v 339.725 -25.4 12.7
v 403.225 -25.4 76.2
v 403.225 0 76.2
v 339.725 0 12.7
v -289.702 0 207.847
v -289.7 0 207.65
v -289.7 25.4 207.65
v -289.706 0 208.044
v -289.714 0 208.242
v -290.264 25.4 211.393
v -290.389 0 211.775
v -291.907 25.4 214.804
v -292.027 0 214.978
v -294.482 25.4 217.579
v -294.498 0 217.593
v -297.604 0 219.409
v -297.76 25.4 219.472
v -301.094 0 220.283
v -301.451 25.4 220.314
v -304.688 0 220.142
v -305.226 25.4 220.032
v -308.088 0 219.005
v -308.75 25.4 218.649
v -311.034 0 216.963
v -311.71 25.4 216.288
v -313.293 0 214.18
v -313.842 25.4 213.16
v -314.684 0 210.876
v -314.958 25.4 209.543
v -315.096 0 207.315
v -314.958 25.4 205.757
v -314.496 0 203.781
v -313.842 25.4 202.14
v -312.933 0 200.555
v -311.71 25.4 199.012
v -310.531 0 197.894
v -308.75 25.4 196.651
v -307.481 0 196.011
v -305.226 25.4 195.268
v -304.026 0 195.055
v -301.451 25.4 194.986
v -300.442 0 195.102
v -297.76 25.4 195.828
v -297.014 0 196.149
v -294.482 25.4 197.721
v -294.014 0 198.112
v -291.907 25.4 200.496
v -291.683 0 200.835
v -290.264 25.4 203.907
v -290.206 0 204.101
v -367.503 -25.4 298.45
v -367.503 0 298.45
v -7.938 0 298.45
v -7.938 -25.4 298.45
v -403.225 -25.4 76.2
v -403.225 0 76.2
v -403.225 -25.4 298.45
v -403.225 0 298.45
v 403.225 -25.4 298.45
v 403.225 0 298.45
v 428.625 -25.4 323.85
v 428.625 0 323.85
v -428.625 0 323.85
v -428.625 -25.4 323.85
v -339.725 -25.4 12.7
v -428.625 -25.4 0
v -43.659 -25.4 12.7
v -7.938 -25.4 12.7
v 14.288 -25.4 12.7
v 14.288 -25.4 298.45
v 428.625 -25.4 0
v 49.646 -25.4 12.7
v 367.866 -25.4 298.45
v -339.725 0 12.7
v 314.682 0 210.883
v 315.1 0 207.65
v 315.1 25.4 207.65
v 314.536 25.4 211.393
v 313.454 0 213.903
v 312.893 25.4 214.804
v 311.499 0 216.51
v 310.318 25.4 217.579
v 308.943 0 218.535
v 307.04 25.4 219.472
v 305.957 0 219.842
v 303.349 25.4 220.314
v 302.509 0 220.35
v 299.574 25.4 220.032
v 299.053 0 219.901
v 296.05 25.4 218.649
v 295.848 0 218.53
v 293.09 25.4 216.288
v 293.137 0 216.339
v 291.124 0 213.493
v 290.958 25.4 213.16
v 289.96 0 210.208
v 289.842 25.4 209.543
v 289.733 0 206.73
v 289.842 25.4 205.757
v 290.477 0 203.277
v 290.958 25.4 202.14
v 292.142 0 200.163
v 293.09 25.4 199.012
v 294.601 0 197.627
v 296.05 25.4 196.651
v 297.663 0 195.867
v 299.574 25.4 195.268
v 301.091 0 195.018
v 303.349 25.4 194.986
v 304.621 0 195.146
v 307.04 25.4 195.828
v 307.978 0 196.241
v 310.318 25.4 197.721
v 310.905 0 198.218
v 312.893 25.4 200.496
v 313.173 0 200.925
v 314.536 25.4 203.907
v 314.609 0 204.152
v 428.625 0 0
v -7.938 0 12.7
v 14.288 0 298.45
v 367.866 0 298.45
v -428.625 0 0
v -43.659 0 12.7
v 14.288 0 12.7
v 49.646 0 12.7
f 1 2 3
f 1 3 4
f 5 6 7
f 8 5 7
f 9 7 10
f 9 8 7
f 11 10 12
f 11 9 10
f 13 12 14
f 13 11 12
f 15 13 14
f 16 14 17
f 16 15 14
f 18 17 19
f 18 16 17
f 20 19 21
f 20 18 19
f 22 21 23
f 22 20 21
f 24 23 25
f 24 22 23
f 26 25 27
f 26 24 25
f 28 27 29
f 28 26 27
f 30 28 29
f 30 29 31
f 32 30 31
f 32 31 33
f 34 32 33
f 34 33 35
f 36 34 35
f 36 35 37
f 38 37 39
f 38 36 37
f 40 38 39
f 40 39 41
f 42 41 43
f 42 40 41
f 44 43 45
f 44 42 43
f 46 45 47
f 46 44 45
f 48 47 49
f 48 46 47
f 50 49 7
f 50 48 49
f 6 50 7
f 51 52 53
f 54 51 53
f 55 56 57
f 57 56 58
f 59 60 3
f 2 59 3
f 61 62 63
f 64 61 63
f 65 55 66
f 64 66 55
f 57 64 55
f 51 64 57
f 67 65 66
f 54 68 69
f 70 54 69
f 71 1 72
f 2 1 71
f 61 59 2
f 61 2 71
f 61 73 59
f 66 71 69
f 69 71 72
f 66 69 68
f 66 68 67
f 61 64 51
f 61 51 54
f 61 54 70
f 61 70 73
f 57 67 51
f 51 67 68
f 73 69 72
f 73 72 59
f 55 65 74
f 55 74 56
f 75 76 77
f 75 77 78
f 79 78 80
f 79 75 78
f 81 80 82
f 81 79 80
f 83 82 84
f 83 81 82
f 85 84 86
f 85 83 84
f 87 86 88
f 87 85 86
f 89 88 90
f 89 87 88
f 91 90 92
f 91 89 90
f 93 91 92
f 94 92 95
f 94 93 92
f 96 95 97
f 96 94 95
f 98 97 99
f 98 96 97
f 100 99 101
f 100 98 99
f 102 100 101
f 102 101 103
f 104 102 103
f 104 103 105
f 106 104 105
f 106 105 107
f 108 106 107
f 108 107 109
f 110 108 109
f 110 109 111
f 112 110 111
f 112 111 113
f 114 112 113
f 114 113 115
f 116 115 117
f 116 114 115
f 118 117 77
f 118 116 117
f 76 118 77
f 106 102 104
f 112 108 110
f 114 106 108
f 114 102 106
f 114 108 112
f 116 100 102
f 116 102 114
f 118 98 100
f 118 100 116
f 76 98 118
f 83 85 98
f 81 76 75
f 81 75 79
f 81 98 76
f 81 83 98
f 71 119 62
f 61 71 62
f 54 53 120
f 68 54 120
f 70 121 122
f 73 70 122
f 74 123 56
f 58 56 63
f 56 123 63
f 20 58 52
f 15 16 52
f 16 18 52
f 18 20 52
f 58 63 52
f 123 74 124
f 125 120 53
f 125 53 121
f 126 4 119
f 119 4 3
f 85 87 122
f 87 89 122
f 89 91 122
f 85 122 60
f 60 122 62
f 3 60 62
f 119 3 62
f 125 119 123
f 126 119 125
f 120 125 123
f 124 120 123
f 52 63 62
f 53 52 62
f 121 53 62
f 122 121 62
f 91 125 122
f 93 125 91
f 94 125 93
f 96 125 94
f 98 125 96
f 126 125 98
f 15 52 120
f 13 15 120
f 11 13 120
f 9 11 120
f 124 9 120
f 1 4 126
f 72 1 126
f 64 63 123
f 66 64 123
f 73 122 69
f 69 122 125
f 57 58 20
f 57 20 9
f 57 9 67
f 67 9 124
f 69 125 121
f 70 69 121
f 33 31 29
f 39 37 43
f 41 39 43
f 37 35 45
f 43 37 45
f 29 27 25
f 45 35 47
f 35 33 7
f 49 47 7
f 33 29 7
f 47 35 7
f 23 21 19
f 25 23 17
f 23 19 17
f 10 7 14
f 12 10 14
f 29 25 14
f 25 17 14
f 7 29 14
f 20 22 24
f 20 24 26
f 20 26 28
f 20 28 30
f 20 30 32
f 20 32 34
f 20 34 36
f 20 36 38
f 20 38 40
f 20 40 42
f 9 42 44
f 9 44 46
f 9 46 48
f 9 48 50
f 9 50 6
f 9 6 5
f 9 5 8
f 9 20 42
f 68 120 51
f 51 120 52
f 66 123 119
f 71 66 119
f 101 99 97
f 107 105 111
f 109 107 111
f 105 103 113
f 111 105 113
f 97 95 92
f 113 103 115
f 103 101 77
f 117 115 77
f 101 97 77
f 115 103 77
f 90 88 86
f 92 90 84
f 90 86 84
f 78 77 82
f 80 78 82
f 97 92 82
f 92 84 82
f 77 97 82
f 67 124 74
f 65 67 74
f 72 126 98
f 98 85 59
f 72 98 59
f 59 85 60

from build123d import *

# Parameters (mm, degrees)
F1_DEPTH = 25.4
F3_DEPTH = 25.4
F4_R     = 12.7
F5_DEPTH = 25.4


with BuildPart() as f1:
    # F0 (on Front) → F1 (new body)
    with BuildSketch(Plane.XZ):
        Polygon((403.225, 12.7), (428.625, 12.7), (428.625, 298.45), (428.625, 323.85), (-428.625, 323.85), (-428.625, 298.45), (-428.625, 12.7), (-403.225, 12.7), (-403.225, 298.45), (-43.6594735359, 12.7), (-7.9375, 12.7), (14.2875, 12.7), (49.6461265683, 12.7), (403.225, 298.45), align=None)
        Polygon((-7.9375, 298.45), (-7.9375, 12.7), (-367.5030264641, 298.45), align=None, mode=Mode.SUBTRACT)
        Polygon((367.8663734317, 298.45), (14.2875, 12.7), (14.2875, 298.45), align=None, mode=Mode.SUBTRACT)
        Polygon((428.625, 0), (428.625, 12.7), (403.225, 12.7), (49.6461265683, 12.7), (14.2875, 12.7), (-7.9375, 12.7), (-43.6594735359, 12.7), (-403.225, 12.7), (-428.625, 12.7), (-428.625, 0), align=None)
    extrude(amount=F1_DEPTH)

    # F2 (on face) → F3 (join)
    with BuildSketch(Plane.XZ.offset(25.4)):
        Polygon((-339.725, 12.7), (-403.225, 76.2), (-403.225, 12.7), align=None)
        Polygon((403.225, 76.2), (339.725, 12.7), (403.225, 12.7), align=None)
    extrude(amount=-F3_DEPTH)

    # F4 (on Front) → F5 (join)
    with BuildSketch(Plane.XZ):
        with Locations((-302.4, 207.65)):
            Circle(F4_R)
        with Locations((302.4, 207.65)):
            Circle(F4_R)
    extrude(amount=-F5_DEPTH)


solid = f1.part
